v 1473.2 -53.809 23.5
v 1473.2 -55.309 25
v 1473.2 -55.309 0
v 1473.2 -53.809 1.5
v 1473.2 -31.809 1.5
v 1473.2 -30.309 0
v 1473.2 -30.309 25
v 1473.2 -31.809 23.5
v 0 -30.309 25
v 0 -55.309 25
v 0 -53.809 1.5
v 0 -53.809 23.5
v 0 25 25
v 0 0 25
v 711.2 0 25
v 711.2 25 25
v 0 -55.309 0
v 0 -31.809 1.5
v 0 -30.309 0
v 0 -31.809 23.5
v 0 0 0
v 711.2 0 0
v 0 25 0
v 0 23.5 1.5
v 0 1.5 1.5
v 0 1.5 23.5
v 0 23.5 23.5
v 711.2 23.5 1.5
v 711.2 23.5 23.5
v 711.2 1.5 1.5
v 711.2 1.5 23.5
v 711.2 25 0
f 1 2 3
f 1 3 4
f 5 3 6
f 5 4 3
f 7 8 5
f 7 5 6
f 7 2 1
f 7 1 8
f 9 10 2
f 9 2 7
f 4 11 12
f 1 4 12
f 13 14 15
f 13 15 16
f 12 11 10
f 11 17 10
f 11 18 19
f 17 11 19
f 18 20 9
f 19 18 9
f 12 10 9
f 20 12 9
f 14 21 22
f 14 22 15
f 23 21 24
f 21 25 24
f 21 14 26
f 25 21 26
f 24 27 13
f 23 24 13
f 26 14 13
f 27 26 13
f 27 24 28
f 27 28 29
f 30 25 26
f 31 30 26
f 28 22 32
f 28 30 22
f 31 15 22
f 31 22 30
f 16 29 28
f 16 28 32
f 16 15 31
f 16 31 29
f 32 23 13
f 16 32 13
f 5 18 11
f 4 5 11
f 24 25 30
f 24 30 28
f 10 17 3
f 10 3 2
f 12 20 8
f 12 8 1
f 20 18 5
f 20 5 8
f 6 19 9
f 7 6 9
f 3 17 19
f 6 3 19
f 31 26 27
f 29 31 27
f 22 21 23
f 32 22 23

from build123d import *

# Parameters (mm, degrees)
F0_W     = 25
F0_H     = 25
F1_DEPTH = 711.2
F2_W     = 22
F2_H     = 22
F3_DEPTH = 711.201
F6_W     = 25
F6_H     = 25
F7_DEPTH = 1473.2
F8_W     = 22
F8_H     = 22
F9_DEPTH = 1473.201


with BuildPart() as f1:
    # F0 (on Right) → F1 (new body)
    with BuildSketch(Plane.YZ):
        with Locations((12.5, 12.5)):
            Rectangle(F0_W, F0_H)
    extrude(amount=F1_DEPTH)

    # F2 (on face) → F3 (cut, through all)
    with BuildSketch(Plane.YZ.offset(711.2)):
        with Locations((12.5, 12.5)):
            Rectangle(F2_W, F2_H)
    extrude(amount=-F3_DEPTH, mode=Mode.SUBTRACT)


with BuildPart() as f4_1:
    # F4: copy of F1
    add(f1.part.moved(Location((0, 100, 0))))


with BuildPart() as f7:
    # F6 (on Right) → F7 (new body)
    with BuildSketch(Plane.YZ):
        with Locations((-42.809443, 12.5)):
            Rectangle(F6_W, F6_H)
    extrude(amount=F7_DEPTH)

    # F8 (on face) → F9 (cut, through all)
    with BuildSketch(Plane(origin=(0, 0, 0), x_dir=(0, -1, 0), z_dir=(-1, 0, 0))):
        with Locations((42.809443, 12.5)):
            Rectangle(F8_W, F8_H)
    extrude(amount=-F9_DEPTH, mode=Mode.SUBTRACT)


solid = Compound([f1.part, f7.part])
